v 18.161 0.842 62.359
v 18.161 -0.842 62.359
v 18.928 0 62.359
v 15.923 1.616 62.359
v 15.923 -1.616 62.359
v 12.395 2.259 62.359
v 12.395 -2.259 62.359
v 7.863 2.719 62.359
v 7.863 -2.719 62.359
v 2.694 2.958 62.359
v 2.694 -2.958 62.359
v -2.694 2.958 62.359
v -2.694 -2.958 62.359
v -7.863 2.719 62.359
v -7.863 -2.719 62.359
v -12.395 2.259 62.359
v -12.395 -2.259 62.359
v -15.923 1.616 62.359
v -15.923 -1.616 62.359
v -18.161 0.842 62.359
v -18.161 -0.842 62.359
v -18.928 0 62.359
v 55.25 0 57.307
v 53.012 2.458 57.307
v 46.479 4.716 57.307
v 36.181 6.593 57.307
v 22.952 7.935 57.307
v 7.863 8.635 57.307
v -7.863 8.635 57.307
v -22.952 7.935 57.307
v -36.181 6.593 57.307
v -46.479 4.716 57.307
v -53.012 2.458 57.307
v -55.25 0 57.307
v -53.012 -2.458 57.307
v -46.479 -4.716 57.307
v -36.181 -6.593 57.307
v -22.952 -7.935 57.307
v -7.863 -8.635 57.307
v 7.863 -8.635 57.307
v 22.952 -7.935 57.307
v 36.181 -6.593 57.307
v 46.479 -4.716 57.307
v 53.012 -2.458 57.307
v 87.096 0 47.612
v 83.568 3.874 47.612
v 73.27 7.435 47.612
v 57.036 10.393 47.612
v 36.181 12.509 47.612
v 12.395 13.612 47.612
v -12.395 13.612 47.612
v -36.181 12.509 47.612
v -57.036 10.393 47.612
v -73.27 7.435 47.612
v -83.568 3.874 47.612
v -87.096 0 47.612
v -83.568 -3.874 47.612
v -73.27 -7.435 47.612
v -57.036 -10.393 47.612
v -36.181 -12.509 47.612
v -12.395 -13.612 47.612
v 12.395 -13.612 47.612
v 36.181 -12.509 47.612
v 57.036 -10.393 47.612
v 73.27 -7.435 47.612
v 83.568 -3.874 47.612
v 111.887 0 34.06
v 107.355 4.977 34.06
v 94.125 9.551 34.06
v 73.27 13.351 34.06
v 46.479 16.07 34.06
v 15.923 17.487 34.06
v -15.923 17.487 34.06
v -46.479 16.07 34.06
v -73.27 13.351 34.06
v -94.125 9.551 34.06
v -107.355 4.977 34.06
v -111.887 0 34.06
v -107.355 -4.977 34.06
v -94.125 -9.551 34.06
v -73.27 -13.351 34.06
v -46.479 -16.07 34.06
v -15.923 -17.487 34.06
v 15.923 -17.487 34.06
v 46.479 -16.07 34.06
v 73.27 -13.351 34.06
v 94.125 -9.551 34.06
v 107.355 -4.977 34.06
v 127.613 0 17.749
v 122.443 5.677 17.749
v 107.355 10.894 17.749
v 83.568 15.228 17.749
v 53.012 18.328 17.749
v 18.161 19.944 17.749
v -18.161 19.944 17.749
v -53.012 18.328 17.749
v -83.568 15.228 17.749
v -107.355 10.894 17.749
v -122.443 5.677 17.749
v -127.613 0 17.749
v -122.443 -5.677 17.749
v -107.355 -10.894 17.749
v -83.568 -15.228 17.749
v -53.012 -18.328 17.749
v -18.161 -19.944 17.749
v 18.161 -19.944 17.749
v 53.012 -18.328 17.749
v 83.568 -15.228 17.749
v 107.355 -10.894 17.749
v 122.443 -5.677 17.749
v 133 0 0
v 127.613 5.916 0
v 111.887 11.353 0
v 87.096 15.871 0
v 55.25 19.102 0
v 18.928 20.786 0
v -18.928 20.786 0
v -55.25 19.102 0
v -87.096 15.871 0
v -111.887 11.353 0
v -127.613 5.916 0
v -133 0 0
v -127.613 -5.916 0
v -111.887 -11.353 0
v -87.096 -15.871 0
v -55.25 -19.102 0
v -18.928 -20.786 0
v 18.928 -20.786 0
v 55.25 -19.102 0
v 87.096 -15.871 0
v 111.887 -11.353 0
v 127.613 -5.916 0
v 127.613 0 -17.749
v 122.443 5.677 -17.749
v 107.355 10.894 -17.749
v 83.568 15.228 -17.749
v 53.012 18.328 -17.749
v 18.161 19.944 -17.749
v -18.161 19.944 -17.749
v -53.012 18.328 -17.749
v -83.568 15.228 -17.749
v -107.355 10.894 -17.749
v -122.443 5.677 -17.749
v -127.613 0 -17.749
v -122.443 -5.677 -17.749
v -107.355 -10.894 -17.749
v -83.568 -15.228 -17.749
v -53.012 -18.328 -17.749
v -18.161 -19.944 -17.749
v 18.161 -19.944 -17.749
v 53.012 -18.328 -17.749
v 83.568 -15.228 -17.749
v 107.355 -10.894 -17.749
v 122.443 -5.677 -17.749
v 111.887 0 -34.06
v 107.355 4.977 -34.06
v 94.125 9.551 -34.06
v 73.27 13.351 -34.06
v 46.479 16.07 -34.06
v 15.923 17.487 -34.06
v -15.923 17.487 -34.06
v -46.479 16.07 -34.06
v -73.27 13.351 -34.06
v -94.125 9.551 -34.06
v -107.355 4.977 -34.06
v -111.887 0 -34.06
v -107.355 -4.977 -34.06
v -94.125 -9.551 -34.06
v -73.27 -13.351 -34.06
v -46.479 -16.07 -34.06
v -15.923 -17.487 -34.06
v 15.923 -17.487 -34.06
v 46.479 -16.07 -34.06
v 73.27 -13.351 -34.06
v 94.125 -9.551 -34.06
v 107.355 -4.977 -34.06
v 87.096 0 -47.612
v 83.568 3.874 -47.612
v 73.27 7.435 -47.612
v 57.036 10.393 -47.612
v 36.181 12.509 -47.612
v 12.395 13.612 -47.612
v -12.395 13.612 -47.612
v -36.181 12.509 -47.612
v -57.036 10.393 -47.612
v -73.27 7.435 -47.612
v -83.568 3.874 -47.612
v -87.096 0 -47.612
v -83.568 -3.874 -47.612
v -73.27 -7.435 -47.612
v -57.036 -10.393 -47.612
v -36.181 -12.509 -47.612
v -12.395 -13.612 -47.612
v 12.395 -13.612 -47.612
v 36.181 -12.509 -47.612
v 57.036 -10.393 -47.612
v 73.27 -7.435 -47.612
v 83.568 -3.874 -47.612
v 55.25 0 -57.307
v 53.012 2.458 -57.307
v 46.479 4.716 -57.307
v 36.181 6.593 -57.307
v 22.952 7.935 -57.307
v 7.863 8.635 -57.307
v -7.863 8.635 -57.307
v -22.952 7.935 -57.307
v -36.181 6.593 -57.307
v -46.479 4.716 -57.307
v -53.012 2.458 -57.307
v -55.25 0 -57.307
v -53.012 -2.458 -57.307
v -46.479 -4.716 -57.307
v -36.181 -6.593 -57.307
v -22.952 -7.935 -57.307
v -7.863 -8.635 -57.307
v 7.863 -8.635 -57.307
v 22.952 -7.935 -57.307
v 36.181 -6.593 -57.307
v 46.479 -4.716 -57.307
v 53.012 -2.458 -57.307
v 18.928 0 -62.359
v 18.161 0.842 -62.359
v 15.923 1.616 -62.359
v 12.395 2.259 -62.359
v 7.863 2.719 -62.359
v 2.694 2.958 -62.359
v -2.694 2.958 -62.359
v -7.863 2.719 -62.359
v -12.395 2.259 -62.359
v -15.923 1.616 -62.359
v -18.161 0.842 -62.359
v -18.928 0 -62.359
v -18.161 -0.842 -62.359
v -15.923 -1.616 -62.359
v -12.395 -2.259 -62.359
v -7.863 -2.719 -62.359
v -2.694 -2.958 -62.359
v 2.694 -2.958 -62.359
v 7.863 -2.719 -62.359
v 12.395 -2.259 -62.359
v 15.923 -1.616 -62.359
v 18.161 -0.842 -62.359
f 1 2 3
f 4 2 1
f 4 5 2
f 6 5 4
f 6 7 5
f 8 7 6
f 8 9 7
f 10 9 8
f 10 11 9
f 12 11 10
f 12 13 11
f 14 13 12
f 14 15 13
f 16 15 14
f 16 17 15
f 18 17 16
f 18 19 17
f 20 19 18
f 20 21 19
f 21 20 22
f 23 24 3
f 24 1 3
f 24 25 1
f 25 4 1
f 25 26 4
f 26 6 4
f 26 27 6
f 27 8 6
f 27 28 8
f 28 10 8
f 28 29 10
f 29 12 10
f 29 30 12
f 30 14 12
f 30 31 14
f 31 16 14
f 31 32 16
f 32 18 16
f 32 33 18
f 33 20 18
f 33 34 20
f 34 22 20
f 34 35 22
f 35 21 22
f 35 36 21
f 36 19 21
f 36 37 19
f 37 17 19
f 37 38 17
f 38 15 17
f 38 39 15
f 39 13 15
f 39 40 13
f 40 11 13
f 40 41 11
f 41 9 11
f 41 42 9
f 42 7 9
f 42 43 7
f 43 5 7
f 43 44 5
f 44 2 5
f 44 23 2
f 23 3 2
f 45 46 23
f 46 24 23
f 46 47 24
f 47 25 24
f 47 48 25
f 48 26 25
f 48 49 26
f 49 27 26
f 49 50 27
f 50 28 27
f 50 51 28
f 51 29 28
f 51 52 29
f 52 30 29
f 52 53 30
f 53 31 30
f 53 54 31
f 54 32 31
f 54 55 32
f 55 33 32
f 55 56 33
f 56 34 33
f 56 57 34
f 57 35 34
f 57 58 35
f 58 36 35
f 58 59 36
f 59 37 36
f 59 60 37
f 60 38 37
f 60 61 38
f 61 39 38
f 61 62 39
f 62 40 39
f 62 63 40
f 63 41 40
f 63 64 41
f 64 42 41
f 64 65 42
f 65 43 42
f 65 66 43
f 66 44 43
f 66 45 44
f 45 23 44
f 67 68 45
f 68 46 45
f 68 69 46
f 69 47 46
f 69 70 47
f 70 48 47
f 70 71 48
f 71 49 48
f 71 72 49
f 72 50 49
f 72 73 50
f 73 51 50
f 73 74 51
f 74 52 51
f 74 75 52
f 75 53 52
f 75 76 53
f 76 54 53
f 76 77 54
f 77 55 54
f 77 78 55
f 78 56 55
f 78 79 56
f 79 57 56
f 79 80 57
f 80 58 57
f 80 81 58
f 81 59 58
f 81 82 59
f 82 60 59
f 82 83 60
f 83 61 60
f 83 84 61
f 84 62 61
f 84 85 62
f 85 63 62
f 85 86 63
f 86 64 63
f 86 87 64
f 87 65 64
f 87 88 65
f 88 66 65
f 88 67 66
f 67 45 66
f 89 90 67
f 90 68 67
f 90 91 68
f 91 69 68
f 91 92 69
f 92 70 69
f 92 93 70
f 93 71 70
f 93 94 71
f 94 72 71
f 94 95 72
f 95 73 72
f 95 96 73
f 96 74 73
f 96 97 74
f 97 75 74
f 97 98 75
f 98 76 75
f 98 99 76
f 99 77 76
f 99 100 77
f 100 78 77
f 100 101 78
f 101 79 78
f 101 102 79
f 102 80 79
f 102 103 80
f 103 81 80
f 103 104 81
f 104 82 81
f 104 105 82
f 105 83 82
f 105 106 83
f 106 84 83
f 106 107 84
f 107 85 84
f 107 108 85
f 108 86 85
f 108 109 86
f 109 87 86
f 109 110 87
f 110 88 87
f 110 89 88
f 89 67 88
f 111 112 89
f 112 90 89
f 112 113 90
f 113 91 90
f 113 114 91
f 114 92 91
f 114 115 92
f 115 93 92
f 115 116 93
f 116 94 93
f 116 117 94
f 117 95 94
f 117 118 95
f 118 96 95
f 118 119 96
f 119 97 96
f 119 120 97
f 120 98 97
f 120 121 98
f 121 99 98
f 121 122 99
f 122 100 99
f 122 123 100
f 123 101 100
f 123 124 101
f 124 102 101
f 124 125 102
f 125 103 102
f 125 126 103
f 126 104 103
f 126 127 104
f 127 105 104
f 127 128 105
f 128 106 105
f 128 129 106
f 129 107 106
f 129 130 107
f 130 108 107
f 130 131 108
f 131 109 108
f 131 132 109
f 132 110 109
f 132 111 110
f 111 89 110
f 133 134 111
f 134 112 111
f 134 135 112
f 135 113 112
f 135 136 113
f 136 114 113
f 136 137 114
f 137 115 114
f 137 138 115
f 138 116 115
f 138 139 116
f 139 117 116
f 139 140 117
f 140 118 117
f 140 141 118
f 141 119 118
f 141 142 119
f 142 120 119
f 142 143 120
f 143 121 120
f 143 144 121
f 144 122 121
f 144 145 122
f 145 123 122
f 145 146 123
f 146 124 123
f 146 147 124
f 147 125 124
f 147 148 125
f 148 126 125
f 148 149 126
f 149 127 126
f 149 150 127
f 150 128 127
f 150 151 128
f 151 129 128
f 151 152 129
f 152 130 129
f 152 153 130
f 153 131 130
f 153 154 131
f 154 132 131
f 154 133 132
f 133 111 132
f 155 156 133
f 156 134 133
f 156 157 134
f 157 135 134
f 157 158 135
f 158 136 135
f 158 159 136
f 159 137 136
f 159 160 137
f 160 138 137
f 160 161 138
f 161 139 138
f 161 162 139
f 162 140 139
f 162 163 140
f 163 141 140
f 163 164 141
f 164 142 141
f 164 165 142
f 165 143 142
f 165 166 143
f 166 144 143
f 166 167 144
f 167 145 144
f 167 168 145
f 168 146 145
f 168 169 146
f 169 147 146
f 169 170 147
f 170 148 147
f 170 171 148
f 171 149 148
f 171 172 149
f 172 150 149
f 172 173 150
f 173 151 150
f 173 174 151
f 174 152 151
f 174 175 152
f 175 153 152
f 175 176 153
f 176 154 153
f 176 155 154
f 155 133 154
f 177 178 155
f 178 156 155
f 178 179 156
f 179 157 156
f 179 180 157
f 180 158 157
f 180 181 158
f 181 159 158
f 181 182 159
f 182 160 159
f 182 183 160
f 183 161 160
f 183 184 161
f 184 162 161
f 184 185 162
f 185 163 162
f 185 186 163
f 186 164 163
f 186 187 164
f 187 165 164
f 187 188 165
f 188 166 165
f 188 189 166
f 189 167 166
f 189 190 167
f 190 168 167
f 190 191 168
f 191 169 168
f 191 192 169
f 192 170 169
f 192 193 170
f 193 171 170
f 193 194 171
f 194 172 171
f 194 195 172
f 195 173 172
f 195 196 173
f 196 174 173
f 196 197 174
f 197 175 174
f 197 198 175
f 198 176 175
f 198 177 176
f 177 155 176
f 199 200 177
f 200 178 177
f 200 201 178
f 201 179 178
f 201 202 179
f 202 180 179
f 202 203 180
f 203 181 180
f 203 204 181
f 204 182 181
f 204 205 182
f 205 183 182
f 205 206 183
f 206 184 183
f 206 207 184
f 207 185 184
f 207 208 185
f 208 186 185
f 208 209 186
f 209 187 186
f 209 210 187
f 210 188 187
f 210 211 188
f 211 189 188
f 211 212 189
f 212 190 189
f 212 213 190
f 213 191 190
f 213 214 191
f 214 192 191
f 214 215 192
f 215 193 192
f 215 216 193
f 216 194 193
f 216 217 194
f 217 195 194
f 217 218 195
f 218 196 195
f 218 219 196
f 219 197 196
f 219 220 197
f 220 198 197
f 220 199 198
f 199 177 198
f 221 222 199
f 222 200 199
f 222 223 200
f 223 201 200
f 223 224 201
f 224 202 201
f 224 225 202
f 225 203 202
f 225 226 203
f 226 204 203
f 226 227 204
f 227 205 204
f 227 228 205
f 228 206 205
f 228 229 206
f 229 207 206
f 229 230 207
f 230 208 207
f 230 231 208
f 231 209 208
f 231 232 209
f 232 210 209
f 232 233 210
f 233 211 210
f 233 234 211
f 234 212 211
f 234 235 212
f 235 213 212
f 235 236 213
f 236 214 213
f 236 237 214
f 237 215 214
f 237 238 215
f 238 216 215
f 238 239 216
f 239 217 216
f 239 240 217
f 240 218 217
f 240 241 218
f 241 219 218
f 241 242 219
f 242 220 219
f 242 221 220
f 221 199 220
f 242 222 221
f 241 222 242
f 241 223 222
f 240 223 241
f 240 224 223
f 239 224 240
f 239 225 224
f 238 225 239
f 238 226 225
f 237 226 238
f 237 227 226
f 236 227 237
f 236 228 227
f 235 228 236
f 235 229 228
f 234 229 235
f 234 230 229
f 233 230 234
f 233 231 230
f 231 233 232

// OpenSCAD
// Generated by SolidPython 1.0.1 on 2020-07-29 00:46:53


scale(v = [19, 3, 9]) {
	sphere(r = 7);
}
/***********************************************
*********      SolidPython code:      **********
************************************************
 
# import packages: SolidPython
from solid import *
from solid.utils import *
from itertools import chain, combinations, permutations


class Resize:

    def __init__(self, scad_file):
        self.scad_file = scad_file
        #self.scad_file = import_scad(scad_file)
        # cone/cylinder param:
        self.r1 = 0
        self.r2 = 0
        self.h = 0
        # rectangular prism param:
        self.w = 0
        self.l = 0
        # ellipse param:
        self.r = 0

    # import OpenScad code (file name corresponds to shape)


    # classify shape + parameters
    def assign(self, param1, param2, param3):
        if self.scad_file == 'cone.scad':
            self.r1 = param1
            self.r2 = param2
            self.h = param3
        elif self.scad_file == 'cylinder.scad':
            self.r1 = param1
            self.r2 = param2
            self.h = param3
        elif self.scad_file == 'rectangularPrism.scad':
            self.h = param1
            self.l = param2
            self.w = param3
        else:
            self.r = param1
            self.h = param2

    # resize parameters
    def iterate(self):
        x = range(3, 20, 2)
        i = 1
        if self.scad_file == 'cone.scad':
            tempList = list(permutations(x, 2))
            for temp in tempList:
                param1 = temp[0]
                param2 = temp[1]
                filepath = 'produced_scad_files/' + 'cone' + str(param1) + '_' + str(param2) + '_' + '.scad'
                scad_render_to_file(cylinder(h=param1, r1=param2, r2=0), filepath)

        elif self.scad_file == 'cylinder.scad':
            tempList = list(permutations(x, 3))
            for temp in tempList:
                param1 = temp[0]
                param2 = temp[1]
                filepath = 'produced_scad_files/' + 'cylinder' + str(param1) + '_' + str(param2) + '_' + '.scad'
                scad_render_to_file(cylinder(h=param1, r1=param2, r2=param2), filepath)

        elif self.scad_file == 'rectangularPrism.scad':
            tempList = list(permutations(x, 3))
            for temp in tempList:
                param1 = temp[0]
                param2 = temp[1]
                param3 = temp[2]
                filepath = 'produced_scad_files/' + 'rectangularPrism' + str(param1) + '_' + str(param2) + '_' + str(
                    param3) + '.scad'
                scad_render_to_file(cube(size=(param1, param2, param3)), filepath)

        elif self.scad_file == 'ellipse.scad':
            tempList = list(permutations(x, 4))
            for temp in tempList:
                param1 = temp[0]
                param2 = temp[1]
                param3 = temp[2]
                param4 = temp[3]
                filepath = 'produced_scad_files/' + 'ellipse' + str(param1) + '_' + str(param2) + '_' + str(param3) + '_' + str(param4) + '.scad'
                scad_render_to_file(scale([param1, param2, param3])(sphere(r=param4)), filepath)

    def render_to_scadfile(self):
        scad_render_to_file(scad, 'example.scad') 
 
************************************************/
